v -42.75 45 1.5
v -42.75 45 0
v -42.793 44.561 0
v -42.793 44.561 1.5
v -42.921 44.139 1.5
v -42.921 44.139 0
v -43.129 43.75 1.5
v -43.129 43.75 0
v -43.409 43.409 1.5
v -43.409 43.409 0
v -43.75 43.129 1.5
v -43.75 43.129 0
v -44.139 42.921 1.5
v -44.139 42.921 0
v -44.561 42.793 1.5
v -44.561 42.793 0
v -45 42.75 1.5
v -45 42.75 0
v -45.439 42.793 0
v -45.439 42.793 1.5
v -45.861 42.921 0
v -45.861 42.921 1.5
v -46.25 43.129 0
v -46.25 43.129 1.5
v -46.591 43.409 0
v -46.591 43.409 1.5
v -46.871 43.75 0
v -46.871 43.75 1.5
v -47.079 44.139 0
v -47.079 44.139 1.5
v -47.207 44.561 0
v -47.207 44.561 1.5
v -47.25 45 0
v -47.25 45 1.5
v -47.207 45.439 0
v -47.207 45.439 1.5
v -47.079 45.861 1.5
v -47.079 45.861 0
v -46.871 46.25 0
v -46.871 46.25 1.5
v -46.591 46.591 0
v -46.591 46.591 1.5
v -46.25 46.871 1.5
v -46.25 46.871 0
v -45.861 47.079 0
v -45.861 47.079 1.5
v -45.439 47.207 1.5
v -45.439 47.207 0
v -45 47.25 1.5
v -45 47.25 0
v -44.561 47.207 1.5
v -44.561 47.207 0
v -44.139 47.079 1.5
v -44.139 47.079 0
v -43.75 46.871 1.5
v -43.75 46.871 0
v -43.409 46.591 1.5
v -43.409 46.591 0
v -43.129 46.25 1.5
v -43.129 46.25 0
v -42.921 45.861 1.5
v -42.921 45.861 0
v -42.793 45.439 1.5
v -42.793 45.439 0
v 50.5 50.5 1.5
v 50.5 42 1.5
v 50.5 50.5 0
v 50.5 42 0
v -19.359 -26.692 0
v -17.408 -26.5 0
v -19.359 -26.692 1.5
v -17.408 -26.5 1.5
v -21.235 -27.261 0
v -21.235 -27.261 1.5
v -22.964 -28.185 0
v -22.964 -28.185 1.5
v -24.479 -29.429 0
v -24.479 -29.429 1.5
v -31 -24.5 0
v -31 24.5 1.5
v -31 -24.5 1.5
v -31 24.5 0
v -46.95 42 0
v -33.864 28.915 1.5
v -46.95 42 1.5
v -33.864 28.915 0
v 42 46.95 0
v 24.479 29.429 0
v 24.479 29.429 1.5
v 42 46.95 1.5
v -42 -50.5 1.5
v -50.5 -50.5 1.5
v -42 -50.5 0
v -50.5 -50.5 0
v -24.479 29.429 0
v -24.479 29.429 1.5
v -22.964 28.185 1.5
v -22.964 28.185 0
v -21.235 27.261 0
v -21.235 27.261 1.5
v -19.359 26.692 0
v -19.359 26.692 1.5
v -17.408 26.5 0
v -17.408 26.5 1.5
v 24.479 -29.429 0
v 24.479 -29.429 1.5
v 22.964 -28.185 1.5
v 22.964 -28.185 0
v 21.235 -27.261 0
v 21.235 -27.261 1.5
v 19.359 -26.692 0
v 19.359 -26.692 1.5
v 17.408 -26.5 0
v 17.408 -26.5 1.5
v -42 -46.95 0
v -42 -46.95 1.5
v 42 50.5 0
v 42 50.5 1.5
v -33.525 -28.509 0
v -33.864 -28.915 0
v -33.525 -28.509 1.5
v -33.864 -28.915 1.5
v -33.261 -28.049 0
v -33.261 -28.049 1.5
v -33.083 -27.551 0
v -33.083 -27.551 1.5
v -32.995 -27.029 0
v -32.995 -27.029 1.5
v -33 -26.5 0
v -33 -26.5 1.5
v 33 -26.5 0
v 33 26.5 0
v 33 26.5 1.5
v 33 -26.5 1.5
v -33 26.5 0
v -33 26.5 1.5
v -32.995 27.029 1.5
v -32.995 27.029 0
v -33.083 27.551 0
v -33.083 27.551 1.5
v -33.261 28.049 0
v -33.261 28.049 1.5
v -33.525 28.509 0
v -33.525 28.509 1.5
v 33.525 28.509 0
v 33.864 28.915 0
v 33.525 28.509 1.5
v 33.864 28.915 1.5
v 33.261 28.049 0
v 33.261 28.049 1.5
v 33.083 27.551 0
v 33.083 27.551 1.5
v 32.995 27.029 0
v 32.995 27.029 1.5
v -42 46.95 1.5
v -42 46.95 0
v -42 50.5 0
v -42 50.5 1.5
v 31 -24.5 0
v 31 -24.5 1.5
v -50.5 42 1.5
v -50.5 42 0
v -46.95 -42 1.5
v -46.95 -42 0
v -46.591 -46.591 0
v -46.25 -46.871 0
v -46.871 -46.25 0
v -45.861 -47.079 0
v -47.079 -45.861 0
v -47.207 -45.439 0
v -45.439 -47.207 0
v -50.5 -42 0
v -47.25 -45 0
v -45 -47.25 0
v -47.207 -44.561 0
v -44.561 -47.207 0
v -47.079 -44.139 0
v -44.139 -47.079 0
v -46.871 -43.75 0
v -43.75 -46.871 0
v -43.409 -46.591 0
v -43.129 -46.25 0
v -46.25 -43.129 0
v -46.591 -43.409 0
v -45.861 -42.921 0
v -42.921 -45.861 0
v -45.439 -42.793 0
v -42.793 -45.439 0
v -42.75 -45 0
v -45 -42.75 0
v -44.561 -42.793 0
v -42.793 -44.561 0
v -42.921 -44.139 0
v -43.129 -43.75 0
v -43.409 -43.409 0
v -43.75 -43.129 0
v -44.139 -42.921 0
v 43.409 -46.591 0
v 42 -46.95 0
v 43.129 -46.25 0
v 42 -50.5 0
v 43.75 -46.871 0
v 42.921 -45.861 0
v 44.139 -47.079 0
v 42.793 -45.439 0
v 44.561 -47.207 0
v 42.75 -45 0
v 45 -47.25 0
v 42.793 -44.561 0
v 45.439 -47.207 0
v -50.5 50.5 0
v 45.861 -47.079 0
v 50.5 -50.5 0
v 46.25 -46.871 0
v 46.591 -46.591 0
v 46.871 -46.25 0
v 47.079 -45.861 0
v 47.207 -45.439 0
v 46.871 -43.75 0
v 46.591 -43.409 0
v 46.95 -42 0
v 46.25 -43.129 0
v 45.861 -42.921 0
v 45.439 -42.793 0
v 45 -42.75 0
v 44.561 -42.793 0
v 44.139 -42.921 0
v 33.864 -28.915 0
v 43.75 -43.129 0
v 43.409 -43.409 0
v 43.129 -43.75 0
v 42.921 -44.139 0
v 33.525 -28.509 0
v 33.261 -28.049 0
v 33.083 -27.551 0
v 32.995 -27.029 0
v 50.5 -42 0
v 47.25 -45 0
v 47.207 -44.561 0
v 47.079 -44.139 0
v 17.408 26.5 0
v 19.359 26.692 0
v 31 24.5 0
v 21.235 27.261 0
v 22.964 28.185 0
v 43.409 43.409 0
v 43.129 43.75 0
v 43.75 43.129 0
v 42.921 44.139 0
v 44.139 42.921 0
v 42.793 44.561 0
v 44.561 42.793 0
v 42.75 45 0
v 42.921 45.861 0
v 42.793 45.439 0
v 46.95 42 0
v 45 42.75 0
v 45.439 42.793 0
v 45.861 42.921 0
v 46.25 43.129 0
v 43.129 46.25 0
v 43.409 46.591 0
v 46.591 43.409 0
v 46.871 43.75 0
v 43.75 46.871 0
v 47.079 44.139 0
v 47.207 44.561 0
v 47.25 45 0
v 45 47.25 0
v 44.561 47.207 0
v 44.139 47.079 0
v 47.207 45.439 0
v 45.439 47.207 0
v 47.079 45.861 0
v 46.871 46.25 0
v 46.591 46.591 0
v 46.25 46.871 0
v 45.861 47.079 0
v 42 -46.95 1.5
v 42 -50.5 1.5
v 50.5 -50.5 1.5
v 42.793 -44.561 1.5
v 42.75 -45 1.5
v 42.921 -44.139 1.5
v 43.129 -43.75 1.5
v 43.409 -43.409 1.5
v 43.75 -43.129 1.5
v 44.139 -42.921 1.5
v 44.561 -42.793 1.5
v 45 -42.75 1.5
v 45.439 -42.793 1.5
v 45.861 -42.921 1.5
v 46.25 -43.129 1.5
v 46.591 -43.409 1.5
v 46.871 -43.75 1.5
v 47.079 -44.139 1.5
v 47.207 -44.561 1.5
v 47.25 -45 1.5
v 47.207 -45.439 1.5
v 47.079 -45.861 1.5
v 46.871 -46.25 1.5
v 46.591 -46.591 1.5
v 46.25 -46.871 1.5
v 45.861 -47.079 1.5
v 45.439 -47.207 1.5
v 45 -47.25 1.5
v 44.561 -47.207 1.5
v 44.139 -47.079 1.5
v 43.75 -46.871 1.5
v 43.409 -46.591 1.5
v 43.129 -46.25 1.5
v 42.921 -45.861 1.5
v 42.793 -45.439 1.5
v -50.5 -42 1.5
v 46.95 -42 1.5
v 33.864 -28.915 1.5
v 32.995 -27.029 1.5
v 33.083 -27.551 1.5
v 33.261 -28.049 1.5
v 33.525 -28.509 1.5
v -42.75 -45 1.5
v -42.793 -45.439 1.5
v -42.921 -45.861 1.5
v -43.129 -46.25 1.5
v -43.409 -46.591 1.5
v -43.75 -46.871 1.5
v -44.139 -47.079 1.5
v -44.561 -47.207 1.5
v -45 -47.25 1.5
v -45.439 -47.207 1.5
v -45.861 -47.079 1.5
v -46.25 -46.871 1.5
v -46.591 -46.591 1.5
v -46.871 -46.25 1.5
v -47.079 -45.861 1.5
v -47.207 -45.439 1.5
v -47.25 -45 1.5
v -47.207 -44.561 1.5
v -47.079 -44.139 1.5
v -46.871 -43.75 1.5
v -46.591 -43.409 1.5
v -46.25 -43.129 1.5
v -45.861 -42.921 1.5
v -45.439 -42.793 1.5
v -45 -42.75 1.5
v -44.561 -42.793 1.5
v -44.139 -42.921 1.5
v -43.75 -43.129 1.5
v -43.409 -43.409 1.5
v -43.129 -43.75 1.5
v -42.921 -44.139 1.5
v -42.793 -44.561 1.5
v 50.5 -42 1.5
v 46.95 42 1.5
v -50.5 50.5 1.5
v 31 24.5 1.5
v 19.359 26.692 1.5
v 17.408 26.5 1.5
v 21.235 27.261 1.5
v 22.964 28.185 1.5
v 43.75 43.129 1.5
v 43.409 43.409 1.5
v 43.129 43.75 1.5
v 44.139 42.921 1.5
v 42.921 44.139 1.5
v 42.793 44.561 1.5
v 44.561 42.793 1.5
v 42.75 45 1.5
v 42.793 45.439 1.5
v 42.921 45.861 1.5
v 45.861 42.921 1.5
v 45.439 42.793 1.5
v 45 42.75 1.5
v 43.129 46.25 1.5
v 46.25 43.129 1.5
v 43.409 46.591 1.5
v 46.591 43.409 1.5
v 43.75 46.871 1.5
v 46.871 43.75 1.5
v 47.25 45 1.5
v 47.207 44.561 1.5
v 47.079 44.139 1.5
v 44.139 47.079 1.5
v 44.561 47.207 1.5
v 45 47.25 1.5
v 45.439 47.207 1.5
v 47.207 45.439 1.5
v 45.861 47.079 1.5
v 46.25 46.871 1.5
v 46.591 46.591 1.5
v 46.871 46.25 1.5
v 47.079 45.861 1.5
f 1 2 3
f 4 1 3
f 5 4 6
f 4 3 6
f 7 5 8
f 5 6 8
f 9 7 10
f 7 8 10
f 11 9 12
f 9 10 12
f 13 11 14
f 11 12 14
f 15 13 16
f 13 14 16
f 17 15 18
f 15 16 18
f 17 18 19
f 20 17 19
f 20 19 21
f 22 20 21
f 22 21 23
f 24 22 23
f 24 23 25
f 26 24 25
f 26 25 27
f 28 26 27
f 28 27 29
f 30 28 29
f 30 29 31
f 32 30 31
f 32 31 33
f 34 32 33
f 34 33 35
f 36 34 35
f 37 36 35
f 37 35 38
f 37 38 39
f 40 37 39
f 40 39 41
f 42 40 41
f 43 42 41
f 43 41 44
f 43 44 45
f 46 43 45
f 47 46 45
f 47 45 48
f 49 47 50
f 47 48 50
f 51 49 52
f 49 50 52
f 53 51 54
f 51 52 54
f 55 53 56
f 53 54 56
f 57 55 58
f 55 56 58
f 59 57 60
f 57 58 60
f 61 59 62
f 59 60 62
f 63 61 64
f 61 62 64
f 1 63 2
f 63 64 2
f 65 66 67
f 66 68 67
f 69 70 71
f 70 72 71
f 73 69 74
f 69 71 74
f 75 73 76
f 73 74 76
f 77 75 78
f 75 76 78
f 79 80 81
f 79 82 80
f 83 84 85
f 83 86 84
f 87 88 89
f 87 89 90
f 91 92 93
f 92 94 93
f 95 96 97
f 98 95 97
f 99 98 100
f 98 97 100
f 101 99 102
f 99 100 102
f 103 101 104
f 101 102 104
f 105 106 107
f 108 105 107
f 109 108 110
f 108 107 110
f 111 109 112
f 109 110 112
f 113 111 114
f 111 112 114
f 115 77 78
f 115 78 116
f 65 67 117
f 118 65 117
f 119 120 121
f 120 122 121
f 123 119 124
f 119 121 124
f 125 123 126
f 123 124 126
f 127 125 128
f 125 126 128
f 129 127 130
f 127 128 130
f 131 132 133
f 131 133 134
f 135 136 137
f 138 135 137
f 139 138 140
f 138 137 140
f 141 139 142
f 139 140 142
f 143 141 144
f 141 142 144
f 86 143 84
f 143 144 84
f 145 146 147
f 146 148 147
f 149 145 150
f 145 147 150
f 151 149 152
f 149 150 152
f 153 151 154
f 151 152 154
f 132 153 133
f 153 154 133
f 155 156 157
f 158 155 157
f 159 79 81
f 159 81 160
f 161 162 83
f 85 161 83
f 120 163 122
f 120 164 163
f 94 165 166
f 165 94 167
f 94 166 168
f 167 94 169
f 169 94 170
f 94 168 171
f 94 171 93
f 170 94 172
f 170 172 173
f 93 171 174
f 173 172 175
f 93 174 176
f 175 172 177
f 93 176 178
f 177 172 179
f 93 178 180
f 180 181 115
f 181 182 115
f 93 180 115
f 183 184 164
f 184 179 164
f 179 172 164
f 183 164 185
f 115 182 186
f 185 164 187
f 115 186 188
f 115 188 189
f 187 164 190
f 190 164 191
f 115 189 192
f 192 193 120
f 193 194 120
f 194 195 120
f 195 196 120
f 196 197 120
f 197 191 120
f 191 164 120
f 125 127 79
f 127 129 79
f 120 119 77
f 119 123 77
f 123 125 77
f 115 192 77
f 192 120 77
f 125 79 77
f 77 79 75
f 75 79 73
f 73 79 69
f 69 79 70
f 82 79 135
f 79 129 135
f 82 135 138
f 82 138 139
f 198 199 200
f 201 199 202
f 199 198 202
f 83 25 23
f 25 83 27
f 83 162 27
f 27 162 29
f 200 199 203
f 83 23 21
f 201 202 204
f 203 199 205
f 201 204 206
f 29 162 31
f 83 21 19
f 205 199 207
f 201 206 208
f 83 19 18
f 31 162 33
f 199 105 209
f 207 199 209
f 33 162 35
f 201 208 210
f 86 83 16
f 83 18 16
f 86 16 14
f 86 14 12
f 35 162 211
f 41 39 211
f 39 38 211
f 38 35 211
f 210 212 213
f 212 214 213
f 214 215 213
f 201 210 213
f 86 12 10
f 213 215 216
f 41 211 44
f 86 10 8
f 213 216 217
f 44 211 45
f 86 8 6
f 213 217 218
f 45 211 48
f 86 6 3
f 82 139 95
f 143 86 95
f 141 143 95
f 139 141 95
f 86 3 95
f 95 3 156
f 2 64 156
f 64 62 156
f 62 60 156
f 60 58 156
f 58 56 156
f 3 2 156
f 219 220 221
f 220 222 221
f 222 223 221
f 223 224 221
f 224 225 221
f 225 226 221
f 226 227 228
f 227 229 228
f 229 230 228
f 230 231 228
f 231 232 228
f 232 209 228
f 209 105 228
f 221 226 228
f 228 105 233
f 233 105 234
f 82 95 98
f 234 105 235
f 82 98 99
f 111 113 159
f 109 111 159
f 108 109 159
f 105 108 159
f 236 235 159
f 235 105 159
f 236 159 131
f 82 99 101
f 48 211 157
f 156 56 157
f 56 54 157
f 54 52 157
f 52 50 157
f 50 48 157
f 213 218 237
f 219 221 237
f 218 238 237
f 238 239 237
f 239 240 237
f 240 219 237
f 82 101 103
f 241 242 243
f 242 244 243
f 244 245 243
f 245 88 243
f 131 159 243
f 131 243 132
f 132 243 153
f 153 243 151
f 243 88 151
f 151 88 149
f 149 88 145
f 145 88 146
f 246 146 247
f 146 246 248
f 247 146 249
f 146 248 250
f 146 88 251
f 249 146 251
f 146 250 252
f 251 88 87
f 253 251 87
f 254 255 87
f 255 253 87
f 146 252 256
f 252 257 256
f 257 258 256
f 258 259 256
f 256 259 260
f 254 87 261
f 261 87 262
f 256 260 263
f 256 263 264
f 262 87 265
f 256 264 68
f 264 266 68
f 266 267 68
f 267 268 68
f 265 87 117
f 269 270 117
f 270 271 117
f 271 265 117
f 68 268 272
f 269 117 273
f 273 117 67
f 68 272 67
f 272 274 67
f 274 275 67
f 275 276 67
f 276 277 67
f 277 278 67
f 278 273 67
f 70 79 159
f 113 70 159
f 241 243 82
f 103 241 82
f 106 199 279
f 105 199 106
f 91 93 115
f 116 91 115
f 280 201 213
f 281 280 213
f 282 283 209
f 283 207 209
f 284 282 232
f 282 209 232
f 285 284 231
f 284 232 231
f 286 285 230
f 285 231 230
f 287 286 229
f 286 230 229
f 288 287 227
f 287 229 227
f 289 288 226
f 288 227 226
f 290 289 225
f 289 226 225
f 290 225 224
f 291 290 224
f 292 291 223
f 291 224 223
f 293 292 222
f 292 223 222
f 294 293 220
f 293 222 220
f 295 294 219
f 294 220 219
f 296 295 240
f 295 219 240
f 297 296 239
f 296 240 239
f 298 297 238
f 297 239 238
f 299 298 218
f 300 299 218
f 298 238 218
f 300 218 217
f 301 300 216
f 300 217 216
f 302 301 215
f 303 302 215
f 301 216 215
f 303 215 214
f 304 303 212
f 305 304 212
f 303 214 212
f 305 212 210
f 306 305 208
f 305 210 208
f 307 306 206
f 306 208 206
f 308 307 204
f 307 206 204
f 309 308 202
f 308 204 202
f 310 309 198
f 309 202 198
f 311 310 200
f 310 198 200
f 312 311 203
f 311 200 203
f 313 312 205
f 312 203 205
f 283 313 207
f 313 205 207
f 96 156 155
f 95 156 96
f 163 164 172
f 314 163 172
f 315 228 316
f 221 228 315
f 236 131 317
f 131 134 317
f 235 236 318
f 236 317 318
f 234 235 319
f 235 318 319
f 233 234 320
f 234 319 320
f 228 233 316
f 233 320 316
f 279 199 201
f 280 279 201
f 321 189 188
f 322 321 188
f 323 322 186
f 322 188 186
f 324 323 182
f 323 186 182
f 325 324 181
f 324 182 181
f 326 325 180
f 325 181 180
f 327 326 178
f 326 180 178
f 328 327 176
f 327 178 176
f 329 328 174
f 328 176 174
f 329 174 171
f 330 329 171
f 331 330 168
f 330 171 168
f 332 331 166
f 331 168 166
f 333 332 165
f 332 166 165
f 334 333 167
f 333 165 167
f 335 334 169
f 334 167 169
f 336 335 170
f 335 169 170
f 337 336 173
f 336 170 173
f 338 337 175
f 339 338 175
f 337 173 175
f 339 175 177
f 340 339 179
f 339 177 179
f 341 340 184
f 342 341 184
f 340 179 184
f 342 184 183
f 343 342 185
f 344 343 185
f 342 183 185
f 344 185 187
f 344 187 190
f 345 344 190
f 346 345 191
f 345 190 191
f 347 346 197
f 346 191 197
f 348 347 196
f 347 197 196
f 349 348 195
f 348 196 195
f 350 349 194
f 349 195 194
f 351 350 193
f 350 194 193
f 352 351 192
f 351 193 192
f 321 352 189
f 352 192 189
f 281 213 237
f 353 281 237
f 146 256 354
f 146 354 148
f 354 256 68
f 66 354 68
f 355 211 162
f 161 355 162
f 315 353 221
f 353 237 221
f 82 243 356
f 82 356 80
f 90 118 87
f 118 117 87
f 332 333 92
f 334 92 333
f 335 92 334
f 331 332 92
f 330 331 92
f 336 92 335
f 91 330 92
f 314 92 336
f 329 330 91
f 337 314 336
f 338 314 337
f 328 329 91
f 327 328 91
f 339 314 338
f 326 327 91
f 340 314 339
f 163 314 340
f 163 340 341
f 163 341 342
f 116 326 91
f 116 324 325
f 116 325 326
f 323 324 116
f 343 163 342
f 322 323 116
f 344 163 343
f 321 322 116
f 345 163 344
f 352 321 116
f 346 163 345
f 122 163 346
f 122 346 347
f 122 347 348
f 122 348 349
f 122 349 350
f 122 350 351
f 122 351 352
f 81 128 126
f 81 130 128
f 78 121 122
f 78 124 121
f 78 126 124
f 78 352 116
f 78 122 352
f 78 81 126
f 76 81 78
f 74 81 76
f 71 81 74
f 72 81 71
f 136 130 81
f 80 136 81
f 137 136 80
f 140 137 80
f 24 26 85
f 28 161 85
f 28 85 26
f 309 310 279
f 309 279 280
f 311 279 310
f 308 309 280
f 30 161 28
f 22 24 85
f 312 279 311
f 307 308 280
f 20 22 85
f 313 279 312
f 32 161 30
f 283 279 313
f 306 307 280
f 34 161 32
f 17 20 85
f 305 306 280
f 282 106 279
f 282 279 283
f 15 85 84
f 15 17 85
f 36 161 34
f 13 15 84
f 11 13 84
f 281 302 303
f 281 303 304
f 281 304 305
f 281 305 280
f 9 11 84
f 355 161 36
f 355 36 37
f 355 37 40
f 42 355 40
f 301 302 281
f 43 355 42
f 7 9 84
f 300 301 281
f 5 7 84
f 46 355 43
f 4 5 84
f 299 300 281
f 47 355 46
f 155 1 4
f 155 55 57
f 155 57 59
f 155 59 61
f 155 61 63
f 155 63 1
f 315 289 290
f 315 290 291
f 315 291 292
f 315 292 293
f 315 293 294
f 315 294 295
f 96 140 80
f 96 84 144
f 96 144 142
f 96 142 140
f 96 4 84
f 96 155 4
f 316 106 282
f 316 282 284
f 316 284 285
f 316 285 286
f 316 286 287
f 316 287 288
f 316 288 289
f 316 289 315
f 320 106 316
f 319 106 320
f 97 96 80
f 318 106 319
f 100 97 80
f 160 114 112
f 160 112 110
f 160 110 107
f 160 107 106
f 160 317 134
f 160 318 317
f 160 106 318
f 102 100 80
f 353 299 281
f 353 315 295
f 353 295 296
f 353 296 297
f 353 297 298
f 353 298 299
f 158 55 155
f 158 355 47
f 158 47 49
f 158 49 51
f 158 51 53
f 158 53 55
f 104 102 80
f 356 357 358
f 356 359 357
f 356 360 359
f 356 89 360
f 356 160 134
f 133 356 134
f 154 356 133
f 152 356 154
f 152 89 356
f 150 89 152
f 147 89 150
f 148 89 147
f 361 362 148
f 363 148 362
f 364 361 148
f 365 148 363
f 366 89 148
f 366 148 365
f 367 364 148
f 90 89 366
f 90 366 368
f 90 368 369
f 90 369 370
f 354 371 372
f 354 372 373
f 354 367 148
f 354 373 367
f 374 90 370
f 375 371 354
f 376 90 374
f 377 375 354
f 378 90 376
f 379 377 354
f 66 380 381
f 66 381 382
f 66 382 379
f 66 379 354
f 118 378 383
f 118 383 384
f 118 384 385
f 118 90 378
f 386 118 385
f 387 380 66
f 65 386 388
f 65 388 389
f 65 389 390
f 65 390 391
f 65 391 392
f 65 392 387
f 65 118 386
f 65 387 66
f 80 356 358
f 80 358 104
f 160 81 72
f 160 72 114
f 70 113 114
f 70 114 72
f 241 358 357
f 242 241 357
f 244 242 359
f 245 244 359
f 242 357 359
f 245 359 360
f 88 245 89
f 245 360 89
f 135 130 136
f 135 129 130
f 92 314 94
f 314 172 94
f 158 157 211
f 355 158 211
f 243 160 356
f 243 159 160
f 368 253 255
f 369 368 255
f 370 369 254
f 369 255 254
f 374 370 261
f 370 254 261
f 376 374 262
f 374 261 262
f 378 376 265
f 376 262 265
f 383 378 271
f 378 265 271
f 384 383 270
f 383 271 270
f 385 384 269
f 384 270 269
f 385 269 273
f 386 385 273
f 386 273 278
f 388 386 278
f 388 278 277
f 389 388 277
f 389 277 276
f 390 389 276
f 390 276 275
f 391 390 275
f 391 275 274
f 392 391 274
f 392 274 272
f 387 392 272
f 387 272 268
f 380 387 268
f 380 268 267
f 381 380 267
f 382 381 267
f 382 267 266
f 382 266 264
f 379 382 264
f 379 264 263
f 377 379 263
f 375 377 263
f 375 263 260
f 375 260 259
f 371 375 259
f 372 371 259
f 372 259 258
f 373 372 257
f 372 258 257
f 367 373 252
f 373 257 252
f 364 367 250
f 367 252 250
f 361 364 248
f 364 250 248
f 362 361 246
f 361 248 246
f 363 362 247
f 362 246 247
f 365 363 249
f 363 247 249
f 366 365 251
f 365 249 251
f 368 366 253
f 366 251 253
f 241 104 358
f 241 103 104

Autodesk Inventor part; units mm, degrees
ref_plane "YZ Plane" through (0, 0, 0) normal (1, 0, 0) x (0, 1, 0)
ref_plane "XZ Plane" through (0, 0, 0) normal (0, 1, 0) x (-1, 0, 0)
ref_plane "XY Plane" through (0, 0, 0) normal (0, 0, 1) x (1, 0, 0)
sketch "Sketch1" plane through (0, 0, 0) normal (0, 0, 1) x (1, 0, 0)
  line L0 (-48, 48) -> (48, 48) construction
  line L1 (48, 48) -> (48, -48) construction
  line L2 (48, -48) -> (-48, -48) construction
  line L3 (-48, -48) -> (-48, 48) construction
  circle A0 centre (-45, 45) radius 2.25
  circle A1 centre (45, 45) radius 2.25
  line L4 (45, 45) -> (-45, 45) construction
  line L5 (-45, 45) -> (-45, -45) construction
  line L6 (-45, -45) -> (45, -45) construction
  line L7 (45, -45) -> (45, 45) construction
  circle A2 centre (45, -45) radius 2.25
  circle A3 centre (-45, -45) radius 2.25
  line L8 (-50.5, -50.5) -> (-42, -50.5)
  line L9 (-42, -50.5) -> (-42, -42)
  line L10 (-42, -42) -> (-50.5, -42)
  line L11 (-50.5, -42) -> (-50.5, -50.5)
  line L12 (0, 0) -> (-48, -48) construction
  line L13 (-33, 26.5) -> (33, 26.5)
  line L14 (33, 26.5) -> (33, -26.5)
  line L15 (33, -26.5) -> (-33, -26.5)
  line L16 (-33, -26.5) -> (-33, 26.5)
  line L17 (-2.4749, 2.4749) -> (2.4749, -2.4749)
  line L18 (2.4749, -2.4749) -> (-42.5251, -47.4749)
  line L19 (-42.5251, -47.4749) -> (-47.4749, -42.5251)
  line L20 (-47.4749, -42.5251) -> (-2.4749, 2.4749)
  line L21 (0, 0) -> (-45, -45) construction
  line L22 (31, 24.5) -> (-31, 24.5)
  line L23 (-31, 24.5) -> (-31, -24.5)
  line L24 (-31, -24.5) -> (31, -24.5)
  line L25 (31, -24.5) -> (31, 24.5)
  point P0 (0, 48)
  point P1 (48, 0)
  point P2 (33, 0)
  point P3 (0, 26.5)
  dimension "d0" = 96
  dimension "d1" = 96
  dimension "d2" = 4.5
  dimension "d3" = 4.5
  dimension "d4" = 3
  dimension "d5" = 4.5
  dimension "d6" = 4.5
  dimension "d9" = 3
  dimension "d10" = 3
  dimension "d11" = 66
  dimension "d12" = 53
  dimension "d13" = 7
  dimension "d14" = 0
  dimension "d23" = 5.5
  dimension "d24" = 5.5
  dimension "d25" = 2
extrude "Extrusion1" add sketch "Sketch1" along normal blind 1.5 contours L20 L24 L18 L15 | L15 L16 L13 L14 L18 L24 L25 L22 L23 L20 | L24 L23 L22 L25 L18 L17 L20 | L20 L17 L18 L24
extrude "Extrusion2" add sketch "Sketch1" along normal blind 1.5 contours A3 L19 | A3 L19 L20 L10 L9 L18 | A3 L19 L18 L9 L8 L11 L10 L20 | L20 L15 L18 L9 L10 | L20 L24 L18 L15 | L20 L17 L18 L24 picked at (-45.2318, -44.2867)
extrude "Extrusion3" cut sketch "Sketch1" along normal blind 10 contours A3 L19 | L19 A3
mirror "Mirror1" about plane through (0, 0, 0) normal (1, 0, 0) of "Extrusion2", "Extrusion3"
mirror "Mirror2" about plane through (0, 0, 0) normal (0, 1, 0) of "Extrusion2", "Extrusion3", "Mirror1"
extrude "Extrusion4" cut sketch "Sketch1" along normal blind 10 contours L24 L23 L22 L25 L18 L17 L20 | L20 L17 L18 L24
fillet "Fillet3" radius 3 4 edges at (31.4497, -26.5, 0.75) (31.4497, 26.5, 0.75) (-31.4497, 26.5, 0.75) (-31.4497, -26.5, 0.75)
fillet "Fillet4" radius 10 4 edges at (-21.5503, -26.5, 0.75) (21.5503, -26.5, 0.75) (21.5503, 26.5, 0.75) (-21.5503, 26.5, 0.75)
properties part number "BattHolder"
